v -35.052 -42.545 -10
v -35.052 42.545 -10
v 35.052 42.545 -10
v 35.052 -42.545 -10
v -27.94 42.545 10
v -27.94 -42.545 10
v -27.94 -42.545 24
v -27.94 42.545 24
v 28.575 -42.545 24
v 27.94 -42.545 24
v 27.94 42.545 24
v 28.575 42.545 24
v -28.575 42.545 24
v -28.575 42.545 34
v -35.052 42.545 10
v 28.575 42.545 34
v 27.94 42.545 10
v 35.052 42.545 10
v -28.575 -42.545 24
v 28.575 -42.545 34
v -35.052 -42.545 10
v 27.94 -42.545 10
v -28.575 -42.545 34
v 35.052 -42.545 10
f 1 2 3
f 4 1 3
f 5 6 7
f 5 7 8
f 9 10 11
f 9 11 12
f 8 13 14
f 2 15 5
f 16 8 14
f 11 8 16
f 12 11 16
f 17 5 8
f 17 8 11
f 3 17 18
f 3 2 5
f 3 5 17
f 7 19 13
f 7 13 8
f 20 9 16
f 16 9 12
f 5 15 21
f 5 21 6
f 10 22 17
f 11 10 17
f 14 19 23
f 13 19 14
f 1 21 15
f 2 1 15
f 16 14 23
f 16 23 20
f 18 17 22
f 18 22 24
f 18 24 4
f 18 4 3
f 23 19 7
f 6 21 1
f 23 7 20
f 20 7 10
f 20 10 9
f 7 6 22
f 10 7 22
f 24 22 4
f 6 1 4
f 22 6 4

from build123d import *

# Parameters (mm, degrees)
F0_W     = 70.104
F0_H     = 85.09
F1_DEPTH = 10
F2_W     = 55.88
F2_H     = 85.09
F3_DEPTH = 14
F4_W     = 57.15
F4_H     = 85.09
F5_DEPTH = 10


with BuildPart() as f1:
    # F0 (on Top) → F1 (new body, symmetric)
    with BuildSketch(Plane.XY):
        Rectangle(F0_W, F0_H)
    extrude(amount=F1_DEPTH, both=True)

    # F2 (on face) → F3 (join)
    with BuildSketch(Plane.XY.offset(10)):
        Rectangle(F2_W, F2_H)
    extrude(amount=F3_DEPTH)

    # F4 (on face) → F5 (join)
    with BuildSketch(Plane.XY.offset(24)):
        Rectangle(F4_W, F4_H)
    extrude(amount=F5_DEPTH)


solid = f1.part
